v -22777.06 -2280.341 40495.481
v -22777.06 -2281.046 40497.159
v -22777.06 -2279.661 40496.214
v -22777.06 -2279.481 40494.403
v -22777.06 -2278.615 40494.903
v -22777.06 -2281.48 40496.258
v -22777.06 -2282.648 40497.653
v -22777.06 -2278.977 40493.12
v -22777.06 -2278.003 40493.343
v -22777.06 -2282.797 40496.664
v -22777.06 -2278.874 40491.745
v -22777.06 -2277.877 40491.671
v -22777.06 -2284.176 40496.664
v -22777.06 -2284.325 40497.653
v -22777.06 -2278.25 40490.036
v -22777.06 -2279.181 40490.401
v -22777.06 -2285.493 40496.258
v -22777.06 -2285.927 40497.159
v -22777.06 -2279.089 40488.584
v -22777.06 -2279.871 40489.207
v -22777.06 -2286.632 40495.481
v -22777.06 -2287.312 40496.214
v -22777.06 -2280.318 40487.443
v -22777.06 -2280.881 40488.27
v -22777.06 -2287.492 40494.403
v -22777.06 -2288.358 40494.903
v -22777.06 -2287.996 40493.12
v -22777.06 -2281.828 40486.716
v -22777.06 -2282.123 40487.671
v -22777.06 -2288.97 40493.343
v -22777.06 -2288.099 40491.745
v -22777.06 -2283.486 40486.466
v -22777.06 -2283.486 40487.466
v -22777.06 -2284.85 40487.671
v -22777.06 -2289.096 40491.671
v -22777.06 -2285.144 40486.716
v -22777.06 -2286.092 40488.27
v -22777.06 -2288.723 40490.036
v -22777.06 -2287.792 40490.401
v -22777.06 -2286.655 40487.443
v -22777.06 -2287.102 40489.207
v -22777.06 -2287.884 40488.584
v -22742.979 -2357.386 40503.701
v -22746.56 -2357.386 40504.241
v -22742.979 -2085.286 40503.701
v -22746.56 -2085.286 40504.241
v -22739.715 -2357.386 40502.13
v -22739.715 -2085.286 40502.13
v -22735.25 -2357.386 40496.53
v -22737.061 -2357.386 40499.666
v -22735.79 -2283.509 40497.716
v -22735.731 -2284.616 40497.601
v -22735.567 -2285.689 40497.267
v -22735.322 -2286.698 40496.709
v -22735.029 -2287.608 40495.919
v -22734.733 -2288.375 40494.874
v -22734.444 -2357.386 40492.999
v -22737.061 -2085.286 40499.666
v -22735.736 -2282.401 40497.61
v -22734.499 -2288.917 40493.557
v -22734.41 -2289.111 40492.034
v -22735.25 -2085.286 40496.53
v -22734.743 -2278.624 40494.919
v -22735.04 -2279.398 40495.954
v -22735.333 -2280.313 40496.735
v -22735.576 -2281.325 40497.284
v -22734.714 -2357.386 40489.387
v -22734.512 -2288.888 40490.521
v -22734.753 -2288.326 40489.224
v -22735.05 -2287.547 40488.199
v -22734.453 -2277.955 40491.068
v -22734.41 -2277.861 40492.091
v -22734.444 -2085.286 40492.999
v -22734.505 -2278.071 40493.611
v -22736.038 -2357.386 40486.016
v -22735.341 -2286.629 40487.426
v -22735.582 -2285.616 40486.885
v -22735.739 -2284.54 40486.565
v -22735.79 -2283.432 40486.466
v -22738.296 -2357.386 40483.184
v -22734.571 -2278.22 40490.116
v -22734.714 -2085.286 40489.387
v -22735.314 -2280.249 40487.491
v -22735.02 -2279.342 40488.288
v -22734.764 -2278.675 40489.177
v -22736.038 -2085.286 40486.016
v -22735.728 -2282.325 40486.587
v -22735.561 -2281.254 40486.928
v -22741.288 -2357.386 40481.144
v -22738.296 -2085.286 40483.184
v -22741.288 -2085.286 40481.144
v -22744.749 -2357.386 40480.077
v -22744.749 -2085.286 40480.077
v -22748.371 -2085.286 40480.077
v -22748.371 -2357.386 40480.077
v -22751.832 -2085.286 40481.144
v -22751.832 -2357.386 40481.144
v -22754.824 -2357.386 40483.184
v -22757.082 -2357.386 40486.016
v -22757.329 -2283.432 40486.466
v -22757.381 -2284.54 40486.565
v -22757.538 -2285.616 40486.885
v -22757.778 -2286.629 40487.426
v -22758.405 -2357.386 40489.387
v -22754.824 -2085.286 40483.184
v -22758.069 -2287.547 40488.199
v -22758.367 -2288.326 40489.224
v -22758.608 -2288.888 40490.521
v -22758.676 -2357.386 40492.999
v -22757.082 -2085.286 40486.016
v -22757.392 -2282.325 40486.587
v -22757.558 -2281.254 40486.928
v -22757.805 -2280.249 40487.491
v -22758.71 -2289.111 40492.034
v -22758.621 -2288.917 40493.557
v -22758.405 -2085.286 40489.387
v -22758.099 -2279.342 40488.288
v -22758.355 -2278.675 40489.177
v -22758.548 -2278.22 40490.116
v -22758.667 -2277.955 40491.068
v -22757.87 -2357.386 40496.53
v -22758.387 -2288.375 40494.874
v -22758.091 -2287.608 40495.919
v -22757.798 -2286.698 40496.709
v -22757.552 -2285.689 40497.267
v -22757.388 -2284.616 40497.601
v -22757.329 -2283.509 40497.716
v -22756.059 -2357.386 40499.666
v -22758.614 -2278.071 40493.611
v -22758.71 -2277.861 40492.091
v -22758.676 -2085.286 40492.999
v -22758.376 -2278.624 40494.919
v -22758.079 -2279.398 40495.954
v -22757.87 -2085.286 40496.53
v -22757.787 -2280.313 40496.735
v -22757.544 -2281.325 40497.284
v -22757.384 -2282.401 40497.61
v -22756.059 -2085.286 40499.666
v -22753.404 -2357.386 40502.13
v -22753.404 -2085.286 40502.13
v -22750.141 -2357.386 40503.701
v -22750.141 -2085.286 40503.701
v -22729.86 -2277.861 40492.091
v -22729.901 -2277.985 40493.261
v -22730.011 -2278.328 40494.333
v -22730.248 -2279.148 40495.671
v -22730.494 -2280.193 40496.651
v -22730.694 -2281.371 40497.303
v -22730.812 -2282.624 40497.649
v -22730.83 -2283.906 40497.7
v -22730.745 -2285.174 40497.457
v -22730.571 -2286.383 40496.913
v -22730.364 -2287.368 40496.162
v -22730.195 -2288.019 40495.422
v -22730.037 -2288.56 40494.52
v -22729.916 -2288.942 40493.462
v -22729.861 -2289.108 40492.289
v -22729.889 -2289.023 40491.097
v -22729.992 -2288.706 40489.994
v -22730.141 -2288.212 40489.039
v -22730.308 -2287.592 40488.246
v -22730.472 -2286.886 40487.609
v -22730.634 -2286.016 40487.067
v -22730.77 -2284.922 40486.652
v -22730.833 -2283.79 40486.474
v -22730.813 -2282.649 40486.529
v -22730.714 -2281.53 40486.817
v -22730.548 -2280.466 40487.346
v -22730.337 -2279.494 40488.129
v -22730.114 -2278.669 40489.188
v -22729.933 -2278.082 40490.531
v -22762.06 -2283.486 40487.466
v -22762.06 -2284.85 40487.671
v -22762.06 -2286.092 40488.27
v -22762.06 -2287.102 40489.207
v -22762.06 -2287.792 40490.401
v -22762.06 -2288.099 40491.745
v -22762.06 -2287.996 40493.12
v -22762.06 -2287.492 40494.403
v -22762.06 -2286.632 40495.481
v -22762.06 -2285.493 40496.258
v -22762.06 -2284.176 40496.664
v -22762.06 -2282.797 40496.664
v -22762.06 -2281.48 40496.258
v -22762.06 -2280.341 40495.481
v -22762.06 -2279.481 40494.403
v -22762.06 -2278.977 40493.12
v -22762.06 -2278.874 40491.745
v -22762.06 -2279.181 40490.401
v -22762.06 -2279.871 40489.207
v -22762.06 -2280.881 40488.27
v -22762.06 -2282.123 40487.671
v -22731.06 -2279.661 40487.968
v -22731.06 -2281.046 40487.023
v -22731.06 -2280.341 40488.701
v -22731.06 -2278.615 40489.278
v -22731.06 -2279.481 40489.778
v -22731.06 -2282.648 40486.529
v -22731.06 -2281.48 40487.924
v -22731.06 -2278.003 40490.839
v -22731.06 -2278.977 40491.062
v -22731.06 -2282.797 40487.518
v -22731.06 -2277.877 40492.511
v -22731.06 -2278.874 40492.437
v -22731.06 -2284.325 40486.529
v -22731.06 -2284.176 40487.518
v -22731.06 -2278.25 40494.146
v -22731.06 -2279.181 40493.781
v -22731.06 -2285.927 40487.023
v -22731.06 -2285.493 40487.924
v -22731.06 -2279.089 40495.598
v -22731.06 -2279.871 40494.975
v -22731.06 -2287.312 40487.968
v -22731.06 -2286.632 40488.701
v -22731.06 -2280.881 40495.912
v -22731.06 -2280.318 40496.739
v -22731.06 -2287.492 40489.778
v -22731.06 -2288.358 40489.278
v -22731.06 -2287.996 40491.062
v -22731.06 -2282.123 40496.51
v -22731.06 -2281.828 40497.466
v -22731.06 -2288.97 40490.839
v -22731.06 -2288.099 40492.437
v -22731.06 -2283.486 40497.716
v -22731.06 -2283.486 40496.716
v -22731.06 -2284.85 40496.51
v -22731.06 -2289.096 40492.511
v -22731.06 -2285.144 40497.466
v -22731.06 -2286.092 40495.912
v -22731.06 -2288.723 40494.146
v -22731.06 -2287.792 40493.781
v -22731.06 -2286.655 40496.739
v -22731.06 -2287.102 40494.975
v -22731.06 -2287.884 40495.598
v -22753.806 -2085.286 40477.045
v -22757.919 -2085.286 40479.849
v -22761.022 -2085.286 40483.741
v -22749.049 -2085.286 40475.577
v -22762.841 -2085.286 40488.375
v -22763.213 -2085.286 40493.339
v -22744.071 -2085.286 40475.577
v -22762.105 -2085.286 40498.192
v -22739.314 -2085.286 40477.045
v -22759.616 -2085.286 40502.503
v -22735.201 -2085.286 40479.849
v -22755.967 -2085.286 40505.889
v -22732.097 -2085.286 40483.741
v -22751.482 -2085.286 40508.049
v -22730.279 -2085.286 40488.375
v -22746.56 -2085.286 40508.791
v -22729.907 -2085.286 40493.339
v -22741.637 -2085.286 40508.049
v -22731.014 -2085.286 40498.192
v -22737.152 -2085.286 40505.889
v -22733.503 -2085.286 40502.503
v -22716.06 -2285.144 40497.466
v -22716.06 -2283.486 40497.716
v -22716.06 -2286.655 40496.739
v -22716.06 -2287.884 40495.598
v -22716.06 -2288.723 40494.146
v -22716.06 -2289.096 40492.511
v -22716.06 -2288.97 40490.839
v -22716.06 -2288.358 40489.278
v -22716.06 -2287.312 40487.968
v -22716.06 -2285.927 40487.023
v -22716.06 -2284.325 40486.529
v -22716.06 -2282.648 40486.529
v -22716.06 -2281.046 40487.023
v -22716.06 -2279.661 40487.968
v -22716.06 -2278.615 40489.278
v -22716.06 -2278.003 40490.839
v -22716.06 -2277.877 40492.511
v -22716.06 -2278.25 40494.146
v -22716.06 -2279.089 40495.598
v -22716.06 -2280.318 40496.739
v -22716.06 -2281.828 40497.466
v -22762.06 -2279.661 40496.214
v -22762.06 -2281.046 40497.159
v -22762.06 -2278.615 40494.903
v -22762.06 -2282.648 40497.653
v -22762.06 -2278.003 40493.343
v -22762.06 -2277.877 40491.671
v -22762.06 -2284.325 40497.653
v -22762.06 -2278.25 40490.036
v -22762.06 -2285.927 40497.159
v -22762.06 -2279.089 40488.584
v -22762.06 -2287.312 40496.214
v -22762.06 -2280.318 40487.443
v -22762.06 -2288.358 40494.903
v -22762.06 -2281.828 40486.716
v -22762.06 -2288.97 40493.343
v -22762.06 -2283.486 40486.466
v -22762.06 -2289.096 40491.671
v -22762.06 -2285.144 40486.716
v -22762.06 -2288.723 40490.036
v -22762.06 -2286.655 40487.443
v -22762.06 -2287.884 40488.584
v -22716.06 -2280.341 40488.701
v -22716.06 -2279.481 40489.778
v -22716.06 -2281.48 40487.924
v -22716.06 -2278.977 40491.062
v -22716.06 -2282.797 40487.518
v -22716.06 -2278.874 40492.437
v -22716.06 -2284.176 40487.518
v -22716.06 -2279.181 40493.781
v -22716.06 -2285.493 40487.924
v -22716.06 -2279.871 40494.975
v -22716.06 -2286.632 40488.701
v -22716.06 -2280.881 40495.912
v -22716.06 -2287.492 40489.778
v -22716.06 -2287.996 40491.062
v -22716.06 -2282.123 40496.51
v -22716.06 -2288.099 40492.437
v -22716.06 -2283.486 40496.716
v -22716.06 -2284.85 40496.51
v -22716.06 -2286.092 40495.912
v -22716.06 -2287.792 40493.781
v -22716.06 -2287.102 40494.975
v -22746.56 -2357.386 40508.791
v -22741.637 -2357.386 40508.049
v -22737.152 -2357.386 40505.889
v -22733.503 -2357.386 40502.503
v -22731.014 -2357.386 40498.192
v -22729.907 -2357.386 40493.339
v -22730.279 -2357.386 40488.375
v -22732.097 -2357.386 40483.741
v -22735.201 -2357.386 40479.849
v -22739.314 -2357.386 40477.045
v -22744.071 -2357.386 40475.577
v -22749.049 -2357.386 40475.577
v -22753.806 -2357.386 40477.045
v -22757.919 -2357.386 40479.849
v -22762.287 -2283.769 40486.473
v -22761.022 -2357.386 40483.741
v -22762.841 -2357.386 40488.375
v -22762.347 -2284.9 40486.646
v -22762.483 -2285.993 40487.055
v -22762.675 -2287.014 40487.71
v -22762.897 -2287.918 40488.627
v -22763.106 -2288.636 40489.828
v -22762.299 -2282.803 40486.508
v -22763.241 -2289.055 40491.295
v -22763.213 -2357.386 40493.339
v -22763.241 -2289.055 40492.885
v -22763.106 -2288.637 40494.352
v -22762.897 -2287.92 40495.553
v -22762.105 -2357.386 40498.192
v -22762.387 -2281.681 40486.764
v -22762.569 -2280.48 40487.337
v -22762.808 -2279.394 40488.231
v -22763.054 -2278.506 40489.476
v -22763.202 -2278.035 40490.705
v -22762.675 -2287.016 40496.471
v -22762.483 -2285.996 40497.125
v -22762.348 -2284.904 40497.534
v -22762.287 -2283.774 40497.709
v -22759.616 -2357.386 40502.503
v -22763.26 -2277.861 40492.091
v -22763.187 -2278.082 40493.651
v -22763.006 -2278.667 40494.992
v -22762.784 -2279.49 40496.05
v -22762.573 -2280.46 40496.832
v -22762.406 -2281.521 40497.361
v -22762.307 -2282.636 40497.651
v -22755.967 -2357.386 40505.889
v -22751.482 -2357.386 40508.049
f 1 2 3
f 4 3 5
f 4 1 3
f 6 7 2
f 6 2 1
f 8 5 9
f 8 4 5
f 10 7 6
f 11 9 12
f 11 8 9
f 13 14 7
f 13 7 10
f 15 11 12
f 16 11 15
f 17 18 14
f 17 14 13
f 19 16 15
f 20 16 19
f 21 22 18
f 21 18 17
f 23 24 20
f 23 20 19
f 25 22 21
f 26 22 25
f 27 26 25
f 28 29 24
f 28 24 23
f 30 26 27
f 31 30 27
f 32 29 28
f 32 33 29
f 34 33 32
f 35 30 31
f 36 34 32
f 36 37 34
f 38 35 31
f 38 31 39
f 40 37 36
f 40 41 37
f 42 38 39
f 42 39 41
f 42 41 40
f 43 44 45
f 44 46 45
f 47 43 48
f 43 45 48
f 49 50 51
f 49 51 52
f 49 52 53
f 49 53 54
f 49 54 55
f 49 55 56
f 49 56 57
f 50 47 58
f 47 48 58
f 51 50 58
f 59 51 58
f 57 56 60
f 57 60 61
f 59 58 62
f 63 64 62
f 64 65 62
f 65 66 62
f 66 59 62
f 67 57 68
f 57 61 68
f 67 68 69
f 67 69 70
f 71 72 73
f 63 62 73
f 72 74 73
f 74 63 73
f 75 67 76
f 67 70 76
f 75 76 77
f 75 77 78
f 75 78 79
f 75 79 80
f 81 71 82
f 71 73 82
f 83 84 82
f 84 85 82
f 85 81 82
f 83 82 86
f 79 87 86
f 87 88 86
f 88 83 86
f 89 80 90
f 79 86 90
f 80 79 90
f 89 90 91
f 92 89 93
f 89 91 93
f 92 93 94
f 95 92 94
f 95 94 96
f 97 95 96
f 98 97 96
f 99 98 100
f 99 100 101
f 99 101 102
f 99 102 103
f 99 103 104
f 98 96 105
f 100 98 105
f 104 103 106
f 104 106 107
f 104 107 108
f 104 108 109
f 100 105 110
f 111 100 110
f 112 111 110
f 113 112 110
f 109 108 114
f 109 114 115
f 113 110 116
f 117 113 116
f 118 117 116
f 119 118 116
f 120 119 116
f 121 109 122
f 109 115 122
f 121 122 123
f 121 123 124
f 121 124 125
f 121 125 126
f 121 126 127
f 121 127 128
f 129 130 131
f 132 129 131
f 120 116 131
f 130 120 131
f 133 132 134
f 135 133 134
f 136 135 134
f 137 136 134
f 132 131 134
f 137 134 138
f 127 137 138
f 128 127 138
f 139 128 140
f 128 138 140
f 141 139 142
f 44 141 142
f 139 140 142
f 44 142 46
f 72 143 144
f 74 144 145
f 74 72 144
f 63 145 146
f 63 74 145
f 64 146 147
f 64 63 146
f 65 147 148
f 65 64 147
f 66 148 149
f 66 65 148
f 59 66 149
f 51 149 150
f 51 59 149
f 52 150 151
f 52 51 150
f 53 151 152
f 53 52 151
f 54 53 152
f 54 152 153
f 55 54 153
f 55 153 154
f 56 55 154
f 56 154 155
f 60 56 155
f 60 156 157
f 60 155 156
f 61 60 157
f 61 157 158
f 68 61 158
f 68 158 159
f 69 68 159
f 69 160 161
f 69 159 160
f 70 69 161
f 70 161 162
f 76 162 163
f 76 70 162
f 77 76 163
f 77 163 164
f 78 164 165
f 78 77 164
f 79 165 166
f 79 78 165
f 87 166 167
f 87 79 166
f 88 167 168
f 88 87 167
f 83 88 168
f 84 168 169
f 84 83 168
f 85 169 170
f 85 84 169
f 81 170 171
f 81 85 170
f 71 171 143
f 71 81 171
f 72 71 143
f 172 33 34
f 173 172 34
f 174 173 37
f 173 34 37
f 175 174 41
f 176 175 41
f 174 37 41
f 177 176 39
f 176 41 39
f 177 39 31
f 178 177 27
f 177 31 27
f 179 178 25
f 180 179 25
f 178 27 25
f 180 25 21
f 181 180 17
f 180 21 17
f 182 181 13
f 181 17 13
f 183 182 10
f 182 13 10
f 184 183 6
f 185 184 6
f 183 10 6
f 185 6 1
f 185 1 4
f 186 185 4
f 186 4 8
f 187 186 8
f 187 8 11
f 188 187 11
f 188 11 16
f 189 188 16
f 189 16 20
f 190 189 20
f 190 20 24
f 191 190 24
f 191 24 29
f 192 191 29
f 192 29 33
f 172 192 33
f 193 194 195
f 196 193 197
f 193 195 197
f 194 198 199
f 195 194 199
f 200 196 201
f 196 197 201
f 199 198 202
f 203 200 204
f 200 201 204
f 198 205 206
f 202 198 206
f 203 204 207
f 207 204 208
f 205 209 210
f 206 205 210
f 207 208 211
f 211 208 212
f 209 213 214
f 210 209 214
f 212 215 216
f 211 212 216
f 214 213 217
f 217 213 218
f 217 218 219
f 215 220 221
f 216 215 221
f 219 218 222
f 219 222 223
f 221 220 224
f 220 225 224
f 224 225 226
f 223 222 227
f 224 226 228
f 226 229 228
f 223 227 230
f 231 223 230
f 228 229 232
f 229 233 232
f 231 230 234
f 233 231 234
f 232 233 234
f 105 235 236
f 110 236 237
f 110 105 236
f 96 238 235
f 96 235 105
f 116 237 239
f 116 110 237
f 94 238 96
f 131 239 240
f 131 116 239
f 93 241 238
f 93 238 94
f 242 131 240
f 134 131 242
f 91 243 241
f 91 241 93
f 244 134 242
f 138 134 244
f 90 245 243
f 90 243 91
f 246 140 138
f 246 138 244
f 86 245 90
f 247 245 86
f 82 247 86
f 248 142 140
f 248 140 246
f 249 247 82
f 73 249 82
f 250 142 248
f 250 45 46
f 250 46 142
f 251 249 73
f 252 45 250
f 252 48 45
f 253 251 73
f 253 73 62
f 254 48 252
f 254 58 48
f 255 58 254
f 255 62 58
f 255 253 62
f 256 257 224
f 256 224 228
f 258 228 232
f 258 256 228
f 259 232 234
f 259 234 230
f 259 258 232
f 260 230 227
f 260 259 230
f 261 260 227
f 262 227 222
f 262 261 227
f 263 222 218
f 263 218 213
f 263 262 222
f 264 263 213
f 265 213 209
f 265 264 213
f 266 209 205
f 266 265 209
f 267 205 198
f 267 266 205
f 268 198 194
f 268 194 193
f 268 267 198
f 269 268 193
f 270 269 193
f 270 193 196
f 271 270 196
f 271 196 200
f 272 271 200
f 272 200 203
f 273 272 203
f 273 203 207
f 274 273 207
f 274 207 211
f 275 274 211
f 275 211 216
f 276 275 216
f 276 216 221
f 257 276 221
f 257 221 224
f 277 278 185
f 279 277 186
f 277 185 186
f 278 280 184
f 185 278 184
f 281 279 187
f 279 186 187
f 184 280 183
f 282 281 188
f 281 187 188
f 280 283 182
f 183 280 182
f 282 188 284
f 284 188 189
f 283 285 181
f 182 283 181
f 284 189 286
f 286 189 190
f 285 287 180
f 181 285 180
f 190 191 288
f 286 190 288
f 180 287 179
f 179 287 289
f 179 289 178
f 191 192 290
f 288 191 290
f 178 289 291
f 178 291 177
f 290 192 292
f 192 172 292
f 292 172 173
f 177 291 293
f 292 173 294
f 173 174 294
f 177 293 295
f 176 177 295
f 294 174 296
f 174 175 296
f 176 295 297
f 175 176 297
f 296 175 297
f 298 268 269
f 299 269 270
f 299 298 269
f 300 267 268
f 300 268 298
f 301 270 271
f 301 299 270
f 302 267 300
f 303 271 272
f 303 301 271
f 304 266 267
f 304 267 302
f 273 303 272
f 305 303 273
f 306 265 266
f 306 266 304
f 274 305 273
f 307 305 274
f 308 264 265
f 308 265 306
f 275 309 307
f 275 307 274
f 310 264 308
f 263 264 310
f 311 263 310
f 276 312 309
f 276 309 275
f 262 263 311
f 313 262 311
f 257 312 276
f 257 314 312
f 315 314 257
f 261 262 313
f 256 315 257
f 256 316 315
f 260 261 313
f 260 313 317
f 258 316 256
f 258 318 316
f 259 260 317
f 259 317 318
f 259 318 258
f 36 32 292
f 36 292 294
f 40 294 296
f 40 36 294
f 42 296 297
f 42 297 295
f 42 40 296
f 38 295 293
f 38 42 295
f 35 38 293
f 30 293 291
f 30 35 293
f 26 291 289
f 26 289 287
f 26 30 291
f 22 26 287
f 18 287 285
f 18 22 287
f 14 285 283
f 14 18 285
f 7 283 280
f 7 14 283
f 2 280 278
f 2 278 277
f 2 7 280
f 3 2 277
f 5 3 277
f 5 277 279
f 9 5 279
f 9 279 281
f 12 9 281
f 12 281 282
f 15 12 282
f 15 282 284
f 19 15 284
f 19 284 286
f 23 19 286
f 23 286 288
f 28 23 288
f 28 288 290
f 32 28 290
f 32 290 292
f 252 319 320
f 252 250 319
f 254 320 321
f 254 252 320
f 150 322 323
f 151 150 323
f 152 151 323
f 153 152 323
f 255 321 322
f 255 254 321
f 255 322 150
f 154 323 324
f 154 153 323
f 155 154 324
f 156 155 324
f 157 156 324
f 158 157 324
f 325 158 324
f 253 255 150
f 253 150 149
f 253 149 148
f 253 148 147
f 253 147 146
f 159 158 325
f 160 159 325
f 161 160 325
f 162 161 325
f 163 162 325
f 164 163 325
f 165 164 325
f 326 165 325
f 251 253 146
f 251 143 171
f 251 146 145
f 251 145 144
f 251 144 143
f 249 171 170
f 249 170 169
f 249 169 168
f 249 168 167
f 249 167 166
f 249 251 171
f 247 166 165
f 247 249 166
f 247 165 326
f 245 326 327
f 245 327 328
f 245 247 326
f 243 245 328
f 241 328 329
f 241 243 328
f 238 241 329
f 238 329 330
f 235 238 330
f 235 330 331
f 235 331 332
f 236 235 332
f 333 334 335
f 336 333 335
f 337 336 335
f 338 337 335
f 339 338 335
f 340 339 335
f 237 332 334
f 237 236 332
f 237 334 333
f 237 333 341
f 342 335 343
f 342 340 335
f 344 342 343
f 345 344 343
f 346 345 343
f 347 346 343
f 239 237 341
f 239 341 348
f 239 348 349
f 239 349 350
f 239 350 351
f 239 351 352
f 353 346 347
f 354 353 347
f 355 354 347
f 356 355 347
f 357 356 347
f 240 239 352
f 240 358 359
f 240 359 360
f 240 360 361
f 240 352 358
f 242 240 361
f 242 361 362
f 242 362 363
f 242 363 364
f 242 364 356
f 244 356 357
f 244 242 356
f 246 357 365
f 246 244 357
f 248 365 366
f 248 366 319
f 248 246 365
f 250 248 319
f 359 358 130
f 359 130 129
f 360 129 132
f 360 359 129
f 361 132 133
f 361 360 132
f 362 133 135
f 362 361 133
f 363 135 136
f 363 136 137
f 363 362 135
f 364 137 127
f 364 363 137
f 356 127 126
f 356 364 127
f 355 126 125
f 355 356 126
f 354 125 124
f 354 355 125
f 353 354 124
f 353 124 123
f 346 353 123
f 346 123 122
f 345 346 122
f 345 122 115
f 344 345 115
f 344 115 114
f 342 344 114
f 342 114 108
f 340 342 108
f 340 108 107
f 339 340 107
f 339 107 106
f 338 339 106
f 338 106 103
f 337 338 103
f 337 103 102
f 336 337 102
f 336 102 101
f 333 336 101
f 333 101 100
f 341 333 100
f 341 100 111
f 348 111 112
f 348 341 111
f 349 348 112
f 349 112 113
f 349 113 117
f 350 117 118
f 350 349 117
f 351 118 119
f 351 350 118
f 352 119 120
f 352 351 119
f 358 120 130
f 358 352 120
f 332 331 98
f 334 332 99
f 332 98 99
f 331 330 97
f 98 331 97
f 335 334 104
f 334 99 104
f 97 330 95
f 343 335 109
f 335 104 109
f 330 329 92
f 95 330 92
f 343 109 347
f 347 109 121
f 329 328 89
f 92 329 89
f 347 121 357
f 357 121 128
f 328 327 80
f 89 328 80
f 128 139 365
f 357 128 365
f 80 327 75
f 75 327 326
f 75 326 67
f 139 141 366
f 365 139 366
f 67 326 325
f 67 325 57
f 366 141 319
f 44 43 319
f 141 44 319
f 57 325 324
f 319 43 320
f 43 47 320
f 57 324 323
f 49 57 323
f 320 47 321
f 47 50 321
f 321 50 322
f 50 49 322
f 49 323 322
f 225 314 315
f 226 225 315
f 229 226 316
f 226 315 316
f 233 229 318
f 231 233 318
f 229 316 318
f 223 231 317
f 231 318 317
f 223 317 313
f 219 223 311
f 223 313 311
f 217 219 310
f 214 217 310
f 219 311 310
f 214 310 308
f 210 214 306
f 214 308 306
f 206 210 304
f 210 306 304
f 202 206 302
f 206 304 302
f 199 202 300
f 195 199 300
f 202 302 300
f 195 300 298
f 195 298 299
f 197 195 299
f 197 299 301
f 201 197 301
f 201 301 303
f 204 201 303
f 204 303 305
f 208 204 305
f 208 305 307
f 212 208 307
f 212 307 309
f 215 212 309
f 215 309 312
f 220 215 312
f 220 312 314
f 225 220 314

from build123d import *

# Parameters (mm, degrees)
SWEEP_THIN1_PROFILE_R   = 16.7
SWEEP_THIN1_PROFILE_R_2 = 12.15
CUT_EXTRUDE1_START      = -22763.271956421
CUT_EXTRUDE1_OUTLINE_R  = 5.625
CUT_EXTRUDE1_DEPTH      = 33.400000142
SWEEP_THIN4_PROFILE_R   = 5.625
SWEEP_THIN4_PROFILE_R_2 = 4.625
CIRPATTERN2_COUNT       = 2


# Read off the part's stored shape, not the designer's step: Cut-Extrude1
with BuildPart() as part:
    # Sweep-Thin1: sweep along a curve in space
    with BuildLine() as sweep_thin1_path:
        Line((-22746.559814756, -2357.386486381, 40492.090937525), (-22746.559814756, -2085.286486381, 40492.090937525))
    # Sweep-Thin1 profile (on start of the path) → Sweep-Thin1 (sweep)
    with BuildSketch(Plane(origin=(-22746.559814756, -2357.386486381, 40492.090937525), x_dir=(0, 0, 1), z_dir=(0, 1, 0))):
        Circle(SWEEP_THIN1_PROFILE_R)
        Circle(SWEEP_THIN1_PROFILE_R_2, mode=Mode.SUBTRACT)
    sweep(path=sweep_thin1_path.line)

    # Cut-Extrude1 outline → Cut-Extrude1 (cut)
    with BuildSketch(Plane(origin=(0, 0, 0), x_dir=(0, 1, 0), z_dir=(0.999999999999955, 0, -2.9985101835401e-07)).offset(CUT_EXTRUDE1_START)):
        with Locations((-2283.486486381, 40492.084116944)):
            Circle(CUT_EXTRUDE1_OUTLINE_R)
    extrude(amount=CUT_EXTRUDE1_DEPTH, mode=Mode.SUBTRACT)


with BuildPart() as body_2:
    # Sweep-Thin4: sweep along a curve in space
    with BuildLine() as sweep_thin4_path:
        Line((-22731.059814756, -2283.486486381, 40492.090937525), (-22716.059814756, -2283.486486381, 40492.090937525))
    # Sweep-Thin4 profile (on start of the path) → Sweep-Thin4 (sweep)
    with BuildSketch(Plane(origin=(-22731.059814756, -2283.486486381, 40492.090937525), x_dir=(0, 0, 1), z_dir=(1, 0, 0))):
        Circle(SWEEP_THIN4_PROFILE_R)
        Circle(SWEEP_THIN4_PROFILE_R_2, mode=Mode.SUBTRACT)
    sweep(path=sweep_thin4_path.line)


with BuildPart() as cirpattern2_1:
    # CirPattern2: pattern copy
    add(body_2.part.rotate(Axis((-22746.559814756, 0, 40492.090937525), (0, 1, 0)), 1 * 360 / CIRPATTERN2_COUNT))


solid = Compound([part.part, body_2.part, cirpattern2_1.part])
